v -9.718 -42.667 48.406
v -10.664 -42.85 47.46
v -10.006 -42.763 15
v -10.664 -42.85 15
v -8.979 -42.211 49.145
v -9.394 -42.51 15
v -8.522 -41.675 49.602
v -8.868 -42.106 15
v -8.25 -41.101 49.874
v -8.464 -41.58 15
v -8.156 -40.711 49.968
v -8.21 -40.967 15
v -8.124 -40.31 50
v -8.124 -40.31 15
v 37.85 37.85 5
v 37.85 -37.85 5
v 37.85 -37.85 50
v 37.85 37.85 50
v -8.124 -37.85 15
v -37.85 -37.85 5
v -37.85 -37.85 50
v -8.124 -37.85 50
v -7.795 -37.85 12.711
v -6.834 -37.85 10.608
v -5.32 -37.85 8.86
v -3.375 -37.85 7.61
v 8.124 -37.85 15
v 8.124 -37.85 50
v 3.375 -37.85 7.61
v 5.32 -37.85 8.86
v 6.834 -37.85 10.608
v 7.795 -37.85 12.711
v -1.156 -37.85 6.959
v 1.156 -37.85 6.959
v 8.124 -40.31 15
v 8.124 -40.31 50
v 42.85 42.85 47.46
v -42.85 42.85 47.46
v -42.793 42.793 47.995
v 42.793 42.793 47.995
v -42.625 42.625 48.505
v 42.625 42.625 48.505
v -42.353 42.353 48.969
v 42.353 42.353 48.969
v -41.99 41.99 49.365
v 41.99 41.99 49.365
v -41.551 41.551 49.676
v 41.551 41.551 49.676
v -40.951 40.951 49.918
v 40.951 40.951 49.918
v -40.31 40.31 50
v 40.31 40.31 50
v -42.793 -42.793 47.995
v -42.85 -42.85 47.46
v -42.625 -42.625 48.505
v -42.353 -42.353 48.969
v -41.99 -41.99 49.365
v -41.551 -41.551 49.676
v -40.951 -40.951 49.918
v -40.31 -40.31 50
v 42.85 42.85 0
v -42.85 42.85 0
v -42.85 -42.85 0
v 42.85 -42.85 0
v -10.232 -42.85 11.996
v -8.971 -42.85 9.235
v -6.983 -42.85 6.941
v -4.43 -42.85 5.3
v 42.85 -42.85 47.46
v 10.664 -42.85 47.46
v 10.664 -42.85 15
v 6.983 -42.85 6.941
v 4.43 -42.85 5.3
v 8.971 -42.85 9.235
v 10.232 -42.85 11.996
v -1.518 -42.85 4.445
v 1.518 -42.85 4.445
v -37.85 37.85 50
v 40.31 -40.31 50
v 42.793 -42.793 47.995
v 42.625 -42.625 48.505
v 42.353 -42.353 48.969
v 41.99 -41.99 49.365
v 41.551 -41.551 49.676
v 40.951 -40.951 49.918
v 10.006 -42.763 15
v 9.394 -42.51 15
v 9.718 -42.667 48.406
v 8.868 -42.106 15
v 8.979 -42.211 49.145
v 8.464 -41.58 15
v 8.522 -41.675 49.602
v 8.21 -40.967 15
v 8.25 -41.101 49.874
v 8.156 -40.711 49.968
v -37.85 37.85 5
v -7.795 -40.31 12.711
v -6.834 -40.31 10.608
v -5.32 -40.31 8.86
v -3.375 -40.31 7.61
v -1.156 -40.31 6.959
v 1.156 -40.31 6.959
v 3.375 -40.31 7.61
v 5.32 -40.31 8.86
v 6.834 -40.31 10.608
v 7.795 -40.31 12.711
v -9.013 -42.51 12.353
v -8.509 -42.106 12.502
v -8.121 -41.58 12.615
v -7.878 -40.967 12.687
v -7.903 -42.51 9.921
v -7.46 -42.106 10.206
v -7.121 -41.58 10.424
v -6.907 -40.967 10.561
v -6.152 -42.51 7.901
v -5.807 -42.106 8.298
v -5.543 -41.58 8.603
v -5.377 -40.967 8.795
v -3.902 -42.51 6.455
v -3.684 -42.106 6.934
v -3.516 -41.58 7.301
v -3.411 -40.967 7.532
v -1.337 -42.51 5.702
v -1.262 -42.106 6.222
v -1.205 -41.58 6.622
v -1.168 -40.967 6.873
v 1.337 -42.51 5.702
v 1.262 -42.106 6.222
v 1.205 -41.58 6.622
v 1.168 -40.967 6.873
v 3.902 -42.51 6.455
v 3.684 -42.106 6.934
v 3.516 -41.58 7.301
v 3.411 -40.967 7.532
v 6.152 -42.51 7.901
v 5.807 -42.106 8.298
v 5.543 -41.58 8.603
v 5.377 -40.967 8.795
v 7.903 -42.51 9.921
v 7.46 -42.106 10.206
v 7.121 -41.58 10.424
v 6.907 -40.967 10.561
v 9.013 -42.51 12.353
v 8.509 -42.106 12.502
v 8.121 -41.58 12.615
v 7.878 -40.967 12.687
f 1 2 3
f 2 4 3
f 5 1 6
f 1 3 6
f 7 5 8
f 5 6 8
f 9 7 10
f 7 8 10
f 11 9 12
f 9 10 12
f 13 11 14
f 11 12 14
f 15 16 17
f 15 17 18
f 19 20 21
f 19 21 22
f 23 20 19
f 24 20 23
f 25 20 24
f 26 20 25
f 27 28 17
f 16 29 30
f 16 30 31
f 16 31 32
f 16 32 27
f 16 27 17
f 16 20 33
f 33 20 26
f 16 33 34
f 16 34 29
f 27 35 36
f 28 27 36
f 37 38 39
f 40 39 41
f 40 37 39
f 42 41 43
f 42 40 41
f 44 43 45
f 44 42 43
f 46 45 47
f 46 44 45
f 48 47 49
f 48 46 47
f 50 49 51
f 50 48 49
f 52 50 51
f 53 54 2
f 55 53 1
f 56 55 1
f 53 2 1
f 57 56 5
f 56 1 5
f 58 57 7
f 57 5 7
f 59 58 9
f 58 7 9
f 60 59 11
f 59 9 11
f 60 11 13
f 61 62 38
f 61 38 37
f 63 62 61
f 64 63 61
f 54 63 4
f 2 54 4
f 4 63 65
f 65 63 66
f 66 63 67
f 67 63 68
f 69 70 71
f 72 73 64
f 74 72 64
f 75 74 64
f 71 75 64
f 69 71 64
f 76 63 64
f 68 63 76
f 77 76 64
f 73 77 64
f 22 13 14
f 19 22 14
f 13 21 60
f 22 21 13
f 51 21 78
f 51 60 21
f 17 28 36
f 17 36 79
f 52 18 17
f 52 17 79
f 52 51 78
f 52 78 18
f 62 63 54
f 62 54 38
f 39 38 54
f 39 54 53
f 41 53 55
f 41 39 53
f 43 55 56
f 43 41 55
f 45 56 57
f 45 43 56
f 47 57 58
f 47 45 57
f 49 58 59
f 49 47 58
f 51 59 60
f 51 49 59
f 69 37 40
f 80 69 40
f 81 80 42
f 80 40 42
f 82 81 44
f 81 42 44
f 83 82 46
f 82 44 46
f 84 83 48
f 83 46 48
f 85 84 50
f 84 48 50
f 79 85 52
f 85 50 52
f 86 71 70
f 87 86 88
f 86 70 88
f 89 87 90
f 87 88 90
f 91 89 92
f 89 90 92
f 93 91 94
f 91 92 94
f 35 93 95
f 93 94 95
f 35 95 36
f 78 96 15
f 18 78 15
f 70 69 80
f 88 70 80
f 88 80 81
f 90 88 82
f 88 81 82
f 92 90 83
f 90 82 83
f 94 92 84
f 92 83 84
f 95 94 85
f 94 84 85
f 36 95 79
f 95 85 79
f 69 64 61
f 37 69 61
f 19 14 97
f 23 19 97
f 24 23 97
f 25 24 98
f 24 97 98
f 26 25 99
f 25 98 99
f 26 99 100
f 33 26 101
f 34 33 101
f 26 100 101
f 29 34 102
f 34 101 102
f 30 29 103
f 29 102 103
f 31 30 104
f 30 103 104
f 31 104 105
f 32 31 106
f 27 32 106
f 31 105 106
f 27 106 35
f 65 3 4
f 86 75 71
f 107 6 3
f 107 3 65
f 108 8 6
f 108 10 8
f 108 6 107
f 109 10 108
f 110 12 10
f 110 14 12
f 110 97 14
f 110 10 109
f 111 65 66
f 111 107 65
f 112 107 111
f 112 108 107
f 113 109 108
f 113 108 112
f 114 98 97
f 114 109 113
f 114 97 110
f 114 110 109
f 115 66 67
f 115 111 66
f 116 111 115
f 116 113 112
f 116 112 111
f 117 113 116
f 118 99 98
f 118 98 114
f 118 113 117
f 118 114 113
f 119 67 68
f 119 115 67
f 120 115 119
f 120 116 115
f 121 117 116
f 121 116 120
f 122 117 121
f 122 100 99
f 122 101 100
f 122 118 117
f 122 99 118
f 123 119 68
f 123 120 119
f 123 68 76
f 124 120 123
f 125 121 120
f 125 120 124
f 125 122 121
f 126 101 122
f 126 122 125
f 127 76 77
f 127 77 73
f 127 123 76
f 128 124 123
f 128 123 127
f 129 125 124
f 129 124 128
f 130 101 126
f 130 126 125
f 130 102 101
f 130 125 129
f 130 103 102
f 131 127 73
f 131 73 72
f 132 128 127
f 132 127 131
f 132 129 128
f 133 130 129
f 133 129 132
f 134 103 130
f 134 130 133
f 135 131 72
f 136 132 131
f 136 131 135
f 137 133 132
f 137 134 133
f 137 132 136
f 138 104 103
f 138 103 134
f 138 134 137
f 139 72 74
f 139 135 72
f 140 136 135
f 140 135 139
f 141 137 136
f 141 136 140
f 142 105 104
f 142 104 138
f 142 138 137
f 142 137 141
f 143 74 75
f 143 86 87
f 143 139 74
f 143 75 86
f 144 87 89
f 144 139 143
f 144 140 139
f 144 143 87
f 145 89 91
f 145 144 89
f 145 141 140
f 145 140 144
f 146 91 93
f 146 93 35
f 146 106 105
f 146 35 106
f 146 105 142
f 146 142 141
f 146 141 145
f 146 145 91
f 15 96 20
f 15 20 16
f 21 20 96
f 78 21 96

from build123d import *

# Parameters (mm, degrees)
F0_W     = 85.7
F0_H     = 85.7
F0_W_2   = 75.7
F0_H_2   = 75.7
F1_DEPTH = 50
F2_DEPTH = 5
F4_DEPTH = 20
F5_R     = 2.54


with BuildPart() as f1:
    # F0 (on Top) → F1 (new body)
    with BuildSketch(Plane.XY):
        Rectangle(F0_W, F0_H)
        Rectangle(F0_W_2, F0_H_2, mode=Mode.SUBTRACT)
    extrude(amount=F1_DEPTH)

    # F0 (on Top) → F2 (join)
    with BuildSketch(Plane.XY):
        Rectangle(F0_W_2, F0_H_2)
    extrude(amount=F2_DEPTH)

    # F3 (on face) → F4 (cut)
    with BuildSketch(Plane.XZ.offset(42.85)):
        with BuildLine():
            ThreePointArc((-8.123884, 15), (0, 6.876116), (8.123884, 15))
            Line((8.123884, 15), (-8.123884, 15))
        make_face()
        with BuildLine():
            Line((-8.123884, 15), (8.123884, 15))
            ThreePointArc((8.123884, 15), (0, 23.123884), (-8.123884, 15))
        make_face()
        with BuildLine():
            Line((8.123884, 15), (8.123884, 50))
            Line((8.123884, 50), (-8.123884, 50))
            Line((-8.123884, 50), (-8.123884, 15))
            ThreePointArc((-8.123884, 15), (0, 23.123884), (8.123884, 15))
        make_face()
    extrude(amount=-F4_DEPTH, mode=Mode.SUBTRACT)

    # F5
    f5_edges = [f1.edges().sort_by_distance(p)[0] for p in [
        (0, -42.85, 6.876116),
        (8.123884, -42.85, 32.5),
        (25.486942, -42.85, 50),
        (-25.486942, -42.85, 50),
        (42.85, 0, 50),
        (0, 42.85, 50),
        (-42.85, 0, 50),
        (-8.123884, -42.85, 32.5),
    ]]
    fillet(f5_edges, radius=F5_R)


solid = f1.part
